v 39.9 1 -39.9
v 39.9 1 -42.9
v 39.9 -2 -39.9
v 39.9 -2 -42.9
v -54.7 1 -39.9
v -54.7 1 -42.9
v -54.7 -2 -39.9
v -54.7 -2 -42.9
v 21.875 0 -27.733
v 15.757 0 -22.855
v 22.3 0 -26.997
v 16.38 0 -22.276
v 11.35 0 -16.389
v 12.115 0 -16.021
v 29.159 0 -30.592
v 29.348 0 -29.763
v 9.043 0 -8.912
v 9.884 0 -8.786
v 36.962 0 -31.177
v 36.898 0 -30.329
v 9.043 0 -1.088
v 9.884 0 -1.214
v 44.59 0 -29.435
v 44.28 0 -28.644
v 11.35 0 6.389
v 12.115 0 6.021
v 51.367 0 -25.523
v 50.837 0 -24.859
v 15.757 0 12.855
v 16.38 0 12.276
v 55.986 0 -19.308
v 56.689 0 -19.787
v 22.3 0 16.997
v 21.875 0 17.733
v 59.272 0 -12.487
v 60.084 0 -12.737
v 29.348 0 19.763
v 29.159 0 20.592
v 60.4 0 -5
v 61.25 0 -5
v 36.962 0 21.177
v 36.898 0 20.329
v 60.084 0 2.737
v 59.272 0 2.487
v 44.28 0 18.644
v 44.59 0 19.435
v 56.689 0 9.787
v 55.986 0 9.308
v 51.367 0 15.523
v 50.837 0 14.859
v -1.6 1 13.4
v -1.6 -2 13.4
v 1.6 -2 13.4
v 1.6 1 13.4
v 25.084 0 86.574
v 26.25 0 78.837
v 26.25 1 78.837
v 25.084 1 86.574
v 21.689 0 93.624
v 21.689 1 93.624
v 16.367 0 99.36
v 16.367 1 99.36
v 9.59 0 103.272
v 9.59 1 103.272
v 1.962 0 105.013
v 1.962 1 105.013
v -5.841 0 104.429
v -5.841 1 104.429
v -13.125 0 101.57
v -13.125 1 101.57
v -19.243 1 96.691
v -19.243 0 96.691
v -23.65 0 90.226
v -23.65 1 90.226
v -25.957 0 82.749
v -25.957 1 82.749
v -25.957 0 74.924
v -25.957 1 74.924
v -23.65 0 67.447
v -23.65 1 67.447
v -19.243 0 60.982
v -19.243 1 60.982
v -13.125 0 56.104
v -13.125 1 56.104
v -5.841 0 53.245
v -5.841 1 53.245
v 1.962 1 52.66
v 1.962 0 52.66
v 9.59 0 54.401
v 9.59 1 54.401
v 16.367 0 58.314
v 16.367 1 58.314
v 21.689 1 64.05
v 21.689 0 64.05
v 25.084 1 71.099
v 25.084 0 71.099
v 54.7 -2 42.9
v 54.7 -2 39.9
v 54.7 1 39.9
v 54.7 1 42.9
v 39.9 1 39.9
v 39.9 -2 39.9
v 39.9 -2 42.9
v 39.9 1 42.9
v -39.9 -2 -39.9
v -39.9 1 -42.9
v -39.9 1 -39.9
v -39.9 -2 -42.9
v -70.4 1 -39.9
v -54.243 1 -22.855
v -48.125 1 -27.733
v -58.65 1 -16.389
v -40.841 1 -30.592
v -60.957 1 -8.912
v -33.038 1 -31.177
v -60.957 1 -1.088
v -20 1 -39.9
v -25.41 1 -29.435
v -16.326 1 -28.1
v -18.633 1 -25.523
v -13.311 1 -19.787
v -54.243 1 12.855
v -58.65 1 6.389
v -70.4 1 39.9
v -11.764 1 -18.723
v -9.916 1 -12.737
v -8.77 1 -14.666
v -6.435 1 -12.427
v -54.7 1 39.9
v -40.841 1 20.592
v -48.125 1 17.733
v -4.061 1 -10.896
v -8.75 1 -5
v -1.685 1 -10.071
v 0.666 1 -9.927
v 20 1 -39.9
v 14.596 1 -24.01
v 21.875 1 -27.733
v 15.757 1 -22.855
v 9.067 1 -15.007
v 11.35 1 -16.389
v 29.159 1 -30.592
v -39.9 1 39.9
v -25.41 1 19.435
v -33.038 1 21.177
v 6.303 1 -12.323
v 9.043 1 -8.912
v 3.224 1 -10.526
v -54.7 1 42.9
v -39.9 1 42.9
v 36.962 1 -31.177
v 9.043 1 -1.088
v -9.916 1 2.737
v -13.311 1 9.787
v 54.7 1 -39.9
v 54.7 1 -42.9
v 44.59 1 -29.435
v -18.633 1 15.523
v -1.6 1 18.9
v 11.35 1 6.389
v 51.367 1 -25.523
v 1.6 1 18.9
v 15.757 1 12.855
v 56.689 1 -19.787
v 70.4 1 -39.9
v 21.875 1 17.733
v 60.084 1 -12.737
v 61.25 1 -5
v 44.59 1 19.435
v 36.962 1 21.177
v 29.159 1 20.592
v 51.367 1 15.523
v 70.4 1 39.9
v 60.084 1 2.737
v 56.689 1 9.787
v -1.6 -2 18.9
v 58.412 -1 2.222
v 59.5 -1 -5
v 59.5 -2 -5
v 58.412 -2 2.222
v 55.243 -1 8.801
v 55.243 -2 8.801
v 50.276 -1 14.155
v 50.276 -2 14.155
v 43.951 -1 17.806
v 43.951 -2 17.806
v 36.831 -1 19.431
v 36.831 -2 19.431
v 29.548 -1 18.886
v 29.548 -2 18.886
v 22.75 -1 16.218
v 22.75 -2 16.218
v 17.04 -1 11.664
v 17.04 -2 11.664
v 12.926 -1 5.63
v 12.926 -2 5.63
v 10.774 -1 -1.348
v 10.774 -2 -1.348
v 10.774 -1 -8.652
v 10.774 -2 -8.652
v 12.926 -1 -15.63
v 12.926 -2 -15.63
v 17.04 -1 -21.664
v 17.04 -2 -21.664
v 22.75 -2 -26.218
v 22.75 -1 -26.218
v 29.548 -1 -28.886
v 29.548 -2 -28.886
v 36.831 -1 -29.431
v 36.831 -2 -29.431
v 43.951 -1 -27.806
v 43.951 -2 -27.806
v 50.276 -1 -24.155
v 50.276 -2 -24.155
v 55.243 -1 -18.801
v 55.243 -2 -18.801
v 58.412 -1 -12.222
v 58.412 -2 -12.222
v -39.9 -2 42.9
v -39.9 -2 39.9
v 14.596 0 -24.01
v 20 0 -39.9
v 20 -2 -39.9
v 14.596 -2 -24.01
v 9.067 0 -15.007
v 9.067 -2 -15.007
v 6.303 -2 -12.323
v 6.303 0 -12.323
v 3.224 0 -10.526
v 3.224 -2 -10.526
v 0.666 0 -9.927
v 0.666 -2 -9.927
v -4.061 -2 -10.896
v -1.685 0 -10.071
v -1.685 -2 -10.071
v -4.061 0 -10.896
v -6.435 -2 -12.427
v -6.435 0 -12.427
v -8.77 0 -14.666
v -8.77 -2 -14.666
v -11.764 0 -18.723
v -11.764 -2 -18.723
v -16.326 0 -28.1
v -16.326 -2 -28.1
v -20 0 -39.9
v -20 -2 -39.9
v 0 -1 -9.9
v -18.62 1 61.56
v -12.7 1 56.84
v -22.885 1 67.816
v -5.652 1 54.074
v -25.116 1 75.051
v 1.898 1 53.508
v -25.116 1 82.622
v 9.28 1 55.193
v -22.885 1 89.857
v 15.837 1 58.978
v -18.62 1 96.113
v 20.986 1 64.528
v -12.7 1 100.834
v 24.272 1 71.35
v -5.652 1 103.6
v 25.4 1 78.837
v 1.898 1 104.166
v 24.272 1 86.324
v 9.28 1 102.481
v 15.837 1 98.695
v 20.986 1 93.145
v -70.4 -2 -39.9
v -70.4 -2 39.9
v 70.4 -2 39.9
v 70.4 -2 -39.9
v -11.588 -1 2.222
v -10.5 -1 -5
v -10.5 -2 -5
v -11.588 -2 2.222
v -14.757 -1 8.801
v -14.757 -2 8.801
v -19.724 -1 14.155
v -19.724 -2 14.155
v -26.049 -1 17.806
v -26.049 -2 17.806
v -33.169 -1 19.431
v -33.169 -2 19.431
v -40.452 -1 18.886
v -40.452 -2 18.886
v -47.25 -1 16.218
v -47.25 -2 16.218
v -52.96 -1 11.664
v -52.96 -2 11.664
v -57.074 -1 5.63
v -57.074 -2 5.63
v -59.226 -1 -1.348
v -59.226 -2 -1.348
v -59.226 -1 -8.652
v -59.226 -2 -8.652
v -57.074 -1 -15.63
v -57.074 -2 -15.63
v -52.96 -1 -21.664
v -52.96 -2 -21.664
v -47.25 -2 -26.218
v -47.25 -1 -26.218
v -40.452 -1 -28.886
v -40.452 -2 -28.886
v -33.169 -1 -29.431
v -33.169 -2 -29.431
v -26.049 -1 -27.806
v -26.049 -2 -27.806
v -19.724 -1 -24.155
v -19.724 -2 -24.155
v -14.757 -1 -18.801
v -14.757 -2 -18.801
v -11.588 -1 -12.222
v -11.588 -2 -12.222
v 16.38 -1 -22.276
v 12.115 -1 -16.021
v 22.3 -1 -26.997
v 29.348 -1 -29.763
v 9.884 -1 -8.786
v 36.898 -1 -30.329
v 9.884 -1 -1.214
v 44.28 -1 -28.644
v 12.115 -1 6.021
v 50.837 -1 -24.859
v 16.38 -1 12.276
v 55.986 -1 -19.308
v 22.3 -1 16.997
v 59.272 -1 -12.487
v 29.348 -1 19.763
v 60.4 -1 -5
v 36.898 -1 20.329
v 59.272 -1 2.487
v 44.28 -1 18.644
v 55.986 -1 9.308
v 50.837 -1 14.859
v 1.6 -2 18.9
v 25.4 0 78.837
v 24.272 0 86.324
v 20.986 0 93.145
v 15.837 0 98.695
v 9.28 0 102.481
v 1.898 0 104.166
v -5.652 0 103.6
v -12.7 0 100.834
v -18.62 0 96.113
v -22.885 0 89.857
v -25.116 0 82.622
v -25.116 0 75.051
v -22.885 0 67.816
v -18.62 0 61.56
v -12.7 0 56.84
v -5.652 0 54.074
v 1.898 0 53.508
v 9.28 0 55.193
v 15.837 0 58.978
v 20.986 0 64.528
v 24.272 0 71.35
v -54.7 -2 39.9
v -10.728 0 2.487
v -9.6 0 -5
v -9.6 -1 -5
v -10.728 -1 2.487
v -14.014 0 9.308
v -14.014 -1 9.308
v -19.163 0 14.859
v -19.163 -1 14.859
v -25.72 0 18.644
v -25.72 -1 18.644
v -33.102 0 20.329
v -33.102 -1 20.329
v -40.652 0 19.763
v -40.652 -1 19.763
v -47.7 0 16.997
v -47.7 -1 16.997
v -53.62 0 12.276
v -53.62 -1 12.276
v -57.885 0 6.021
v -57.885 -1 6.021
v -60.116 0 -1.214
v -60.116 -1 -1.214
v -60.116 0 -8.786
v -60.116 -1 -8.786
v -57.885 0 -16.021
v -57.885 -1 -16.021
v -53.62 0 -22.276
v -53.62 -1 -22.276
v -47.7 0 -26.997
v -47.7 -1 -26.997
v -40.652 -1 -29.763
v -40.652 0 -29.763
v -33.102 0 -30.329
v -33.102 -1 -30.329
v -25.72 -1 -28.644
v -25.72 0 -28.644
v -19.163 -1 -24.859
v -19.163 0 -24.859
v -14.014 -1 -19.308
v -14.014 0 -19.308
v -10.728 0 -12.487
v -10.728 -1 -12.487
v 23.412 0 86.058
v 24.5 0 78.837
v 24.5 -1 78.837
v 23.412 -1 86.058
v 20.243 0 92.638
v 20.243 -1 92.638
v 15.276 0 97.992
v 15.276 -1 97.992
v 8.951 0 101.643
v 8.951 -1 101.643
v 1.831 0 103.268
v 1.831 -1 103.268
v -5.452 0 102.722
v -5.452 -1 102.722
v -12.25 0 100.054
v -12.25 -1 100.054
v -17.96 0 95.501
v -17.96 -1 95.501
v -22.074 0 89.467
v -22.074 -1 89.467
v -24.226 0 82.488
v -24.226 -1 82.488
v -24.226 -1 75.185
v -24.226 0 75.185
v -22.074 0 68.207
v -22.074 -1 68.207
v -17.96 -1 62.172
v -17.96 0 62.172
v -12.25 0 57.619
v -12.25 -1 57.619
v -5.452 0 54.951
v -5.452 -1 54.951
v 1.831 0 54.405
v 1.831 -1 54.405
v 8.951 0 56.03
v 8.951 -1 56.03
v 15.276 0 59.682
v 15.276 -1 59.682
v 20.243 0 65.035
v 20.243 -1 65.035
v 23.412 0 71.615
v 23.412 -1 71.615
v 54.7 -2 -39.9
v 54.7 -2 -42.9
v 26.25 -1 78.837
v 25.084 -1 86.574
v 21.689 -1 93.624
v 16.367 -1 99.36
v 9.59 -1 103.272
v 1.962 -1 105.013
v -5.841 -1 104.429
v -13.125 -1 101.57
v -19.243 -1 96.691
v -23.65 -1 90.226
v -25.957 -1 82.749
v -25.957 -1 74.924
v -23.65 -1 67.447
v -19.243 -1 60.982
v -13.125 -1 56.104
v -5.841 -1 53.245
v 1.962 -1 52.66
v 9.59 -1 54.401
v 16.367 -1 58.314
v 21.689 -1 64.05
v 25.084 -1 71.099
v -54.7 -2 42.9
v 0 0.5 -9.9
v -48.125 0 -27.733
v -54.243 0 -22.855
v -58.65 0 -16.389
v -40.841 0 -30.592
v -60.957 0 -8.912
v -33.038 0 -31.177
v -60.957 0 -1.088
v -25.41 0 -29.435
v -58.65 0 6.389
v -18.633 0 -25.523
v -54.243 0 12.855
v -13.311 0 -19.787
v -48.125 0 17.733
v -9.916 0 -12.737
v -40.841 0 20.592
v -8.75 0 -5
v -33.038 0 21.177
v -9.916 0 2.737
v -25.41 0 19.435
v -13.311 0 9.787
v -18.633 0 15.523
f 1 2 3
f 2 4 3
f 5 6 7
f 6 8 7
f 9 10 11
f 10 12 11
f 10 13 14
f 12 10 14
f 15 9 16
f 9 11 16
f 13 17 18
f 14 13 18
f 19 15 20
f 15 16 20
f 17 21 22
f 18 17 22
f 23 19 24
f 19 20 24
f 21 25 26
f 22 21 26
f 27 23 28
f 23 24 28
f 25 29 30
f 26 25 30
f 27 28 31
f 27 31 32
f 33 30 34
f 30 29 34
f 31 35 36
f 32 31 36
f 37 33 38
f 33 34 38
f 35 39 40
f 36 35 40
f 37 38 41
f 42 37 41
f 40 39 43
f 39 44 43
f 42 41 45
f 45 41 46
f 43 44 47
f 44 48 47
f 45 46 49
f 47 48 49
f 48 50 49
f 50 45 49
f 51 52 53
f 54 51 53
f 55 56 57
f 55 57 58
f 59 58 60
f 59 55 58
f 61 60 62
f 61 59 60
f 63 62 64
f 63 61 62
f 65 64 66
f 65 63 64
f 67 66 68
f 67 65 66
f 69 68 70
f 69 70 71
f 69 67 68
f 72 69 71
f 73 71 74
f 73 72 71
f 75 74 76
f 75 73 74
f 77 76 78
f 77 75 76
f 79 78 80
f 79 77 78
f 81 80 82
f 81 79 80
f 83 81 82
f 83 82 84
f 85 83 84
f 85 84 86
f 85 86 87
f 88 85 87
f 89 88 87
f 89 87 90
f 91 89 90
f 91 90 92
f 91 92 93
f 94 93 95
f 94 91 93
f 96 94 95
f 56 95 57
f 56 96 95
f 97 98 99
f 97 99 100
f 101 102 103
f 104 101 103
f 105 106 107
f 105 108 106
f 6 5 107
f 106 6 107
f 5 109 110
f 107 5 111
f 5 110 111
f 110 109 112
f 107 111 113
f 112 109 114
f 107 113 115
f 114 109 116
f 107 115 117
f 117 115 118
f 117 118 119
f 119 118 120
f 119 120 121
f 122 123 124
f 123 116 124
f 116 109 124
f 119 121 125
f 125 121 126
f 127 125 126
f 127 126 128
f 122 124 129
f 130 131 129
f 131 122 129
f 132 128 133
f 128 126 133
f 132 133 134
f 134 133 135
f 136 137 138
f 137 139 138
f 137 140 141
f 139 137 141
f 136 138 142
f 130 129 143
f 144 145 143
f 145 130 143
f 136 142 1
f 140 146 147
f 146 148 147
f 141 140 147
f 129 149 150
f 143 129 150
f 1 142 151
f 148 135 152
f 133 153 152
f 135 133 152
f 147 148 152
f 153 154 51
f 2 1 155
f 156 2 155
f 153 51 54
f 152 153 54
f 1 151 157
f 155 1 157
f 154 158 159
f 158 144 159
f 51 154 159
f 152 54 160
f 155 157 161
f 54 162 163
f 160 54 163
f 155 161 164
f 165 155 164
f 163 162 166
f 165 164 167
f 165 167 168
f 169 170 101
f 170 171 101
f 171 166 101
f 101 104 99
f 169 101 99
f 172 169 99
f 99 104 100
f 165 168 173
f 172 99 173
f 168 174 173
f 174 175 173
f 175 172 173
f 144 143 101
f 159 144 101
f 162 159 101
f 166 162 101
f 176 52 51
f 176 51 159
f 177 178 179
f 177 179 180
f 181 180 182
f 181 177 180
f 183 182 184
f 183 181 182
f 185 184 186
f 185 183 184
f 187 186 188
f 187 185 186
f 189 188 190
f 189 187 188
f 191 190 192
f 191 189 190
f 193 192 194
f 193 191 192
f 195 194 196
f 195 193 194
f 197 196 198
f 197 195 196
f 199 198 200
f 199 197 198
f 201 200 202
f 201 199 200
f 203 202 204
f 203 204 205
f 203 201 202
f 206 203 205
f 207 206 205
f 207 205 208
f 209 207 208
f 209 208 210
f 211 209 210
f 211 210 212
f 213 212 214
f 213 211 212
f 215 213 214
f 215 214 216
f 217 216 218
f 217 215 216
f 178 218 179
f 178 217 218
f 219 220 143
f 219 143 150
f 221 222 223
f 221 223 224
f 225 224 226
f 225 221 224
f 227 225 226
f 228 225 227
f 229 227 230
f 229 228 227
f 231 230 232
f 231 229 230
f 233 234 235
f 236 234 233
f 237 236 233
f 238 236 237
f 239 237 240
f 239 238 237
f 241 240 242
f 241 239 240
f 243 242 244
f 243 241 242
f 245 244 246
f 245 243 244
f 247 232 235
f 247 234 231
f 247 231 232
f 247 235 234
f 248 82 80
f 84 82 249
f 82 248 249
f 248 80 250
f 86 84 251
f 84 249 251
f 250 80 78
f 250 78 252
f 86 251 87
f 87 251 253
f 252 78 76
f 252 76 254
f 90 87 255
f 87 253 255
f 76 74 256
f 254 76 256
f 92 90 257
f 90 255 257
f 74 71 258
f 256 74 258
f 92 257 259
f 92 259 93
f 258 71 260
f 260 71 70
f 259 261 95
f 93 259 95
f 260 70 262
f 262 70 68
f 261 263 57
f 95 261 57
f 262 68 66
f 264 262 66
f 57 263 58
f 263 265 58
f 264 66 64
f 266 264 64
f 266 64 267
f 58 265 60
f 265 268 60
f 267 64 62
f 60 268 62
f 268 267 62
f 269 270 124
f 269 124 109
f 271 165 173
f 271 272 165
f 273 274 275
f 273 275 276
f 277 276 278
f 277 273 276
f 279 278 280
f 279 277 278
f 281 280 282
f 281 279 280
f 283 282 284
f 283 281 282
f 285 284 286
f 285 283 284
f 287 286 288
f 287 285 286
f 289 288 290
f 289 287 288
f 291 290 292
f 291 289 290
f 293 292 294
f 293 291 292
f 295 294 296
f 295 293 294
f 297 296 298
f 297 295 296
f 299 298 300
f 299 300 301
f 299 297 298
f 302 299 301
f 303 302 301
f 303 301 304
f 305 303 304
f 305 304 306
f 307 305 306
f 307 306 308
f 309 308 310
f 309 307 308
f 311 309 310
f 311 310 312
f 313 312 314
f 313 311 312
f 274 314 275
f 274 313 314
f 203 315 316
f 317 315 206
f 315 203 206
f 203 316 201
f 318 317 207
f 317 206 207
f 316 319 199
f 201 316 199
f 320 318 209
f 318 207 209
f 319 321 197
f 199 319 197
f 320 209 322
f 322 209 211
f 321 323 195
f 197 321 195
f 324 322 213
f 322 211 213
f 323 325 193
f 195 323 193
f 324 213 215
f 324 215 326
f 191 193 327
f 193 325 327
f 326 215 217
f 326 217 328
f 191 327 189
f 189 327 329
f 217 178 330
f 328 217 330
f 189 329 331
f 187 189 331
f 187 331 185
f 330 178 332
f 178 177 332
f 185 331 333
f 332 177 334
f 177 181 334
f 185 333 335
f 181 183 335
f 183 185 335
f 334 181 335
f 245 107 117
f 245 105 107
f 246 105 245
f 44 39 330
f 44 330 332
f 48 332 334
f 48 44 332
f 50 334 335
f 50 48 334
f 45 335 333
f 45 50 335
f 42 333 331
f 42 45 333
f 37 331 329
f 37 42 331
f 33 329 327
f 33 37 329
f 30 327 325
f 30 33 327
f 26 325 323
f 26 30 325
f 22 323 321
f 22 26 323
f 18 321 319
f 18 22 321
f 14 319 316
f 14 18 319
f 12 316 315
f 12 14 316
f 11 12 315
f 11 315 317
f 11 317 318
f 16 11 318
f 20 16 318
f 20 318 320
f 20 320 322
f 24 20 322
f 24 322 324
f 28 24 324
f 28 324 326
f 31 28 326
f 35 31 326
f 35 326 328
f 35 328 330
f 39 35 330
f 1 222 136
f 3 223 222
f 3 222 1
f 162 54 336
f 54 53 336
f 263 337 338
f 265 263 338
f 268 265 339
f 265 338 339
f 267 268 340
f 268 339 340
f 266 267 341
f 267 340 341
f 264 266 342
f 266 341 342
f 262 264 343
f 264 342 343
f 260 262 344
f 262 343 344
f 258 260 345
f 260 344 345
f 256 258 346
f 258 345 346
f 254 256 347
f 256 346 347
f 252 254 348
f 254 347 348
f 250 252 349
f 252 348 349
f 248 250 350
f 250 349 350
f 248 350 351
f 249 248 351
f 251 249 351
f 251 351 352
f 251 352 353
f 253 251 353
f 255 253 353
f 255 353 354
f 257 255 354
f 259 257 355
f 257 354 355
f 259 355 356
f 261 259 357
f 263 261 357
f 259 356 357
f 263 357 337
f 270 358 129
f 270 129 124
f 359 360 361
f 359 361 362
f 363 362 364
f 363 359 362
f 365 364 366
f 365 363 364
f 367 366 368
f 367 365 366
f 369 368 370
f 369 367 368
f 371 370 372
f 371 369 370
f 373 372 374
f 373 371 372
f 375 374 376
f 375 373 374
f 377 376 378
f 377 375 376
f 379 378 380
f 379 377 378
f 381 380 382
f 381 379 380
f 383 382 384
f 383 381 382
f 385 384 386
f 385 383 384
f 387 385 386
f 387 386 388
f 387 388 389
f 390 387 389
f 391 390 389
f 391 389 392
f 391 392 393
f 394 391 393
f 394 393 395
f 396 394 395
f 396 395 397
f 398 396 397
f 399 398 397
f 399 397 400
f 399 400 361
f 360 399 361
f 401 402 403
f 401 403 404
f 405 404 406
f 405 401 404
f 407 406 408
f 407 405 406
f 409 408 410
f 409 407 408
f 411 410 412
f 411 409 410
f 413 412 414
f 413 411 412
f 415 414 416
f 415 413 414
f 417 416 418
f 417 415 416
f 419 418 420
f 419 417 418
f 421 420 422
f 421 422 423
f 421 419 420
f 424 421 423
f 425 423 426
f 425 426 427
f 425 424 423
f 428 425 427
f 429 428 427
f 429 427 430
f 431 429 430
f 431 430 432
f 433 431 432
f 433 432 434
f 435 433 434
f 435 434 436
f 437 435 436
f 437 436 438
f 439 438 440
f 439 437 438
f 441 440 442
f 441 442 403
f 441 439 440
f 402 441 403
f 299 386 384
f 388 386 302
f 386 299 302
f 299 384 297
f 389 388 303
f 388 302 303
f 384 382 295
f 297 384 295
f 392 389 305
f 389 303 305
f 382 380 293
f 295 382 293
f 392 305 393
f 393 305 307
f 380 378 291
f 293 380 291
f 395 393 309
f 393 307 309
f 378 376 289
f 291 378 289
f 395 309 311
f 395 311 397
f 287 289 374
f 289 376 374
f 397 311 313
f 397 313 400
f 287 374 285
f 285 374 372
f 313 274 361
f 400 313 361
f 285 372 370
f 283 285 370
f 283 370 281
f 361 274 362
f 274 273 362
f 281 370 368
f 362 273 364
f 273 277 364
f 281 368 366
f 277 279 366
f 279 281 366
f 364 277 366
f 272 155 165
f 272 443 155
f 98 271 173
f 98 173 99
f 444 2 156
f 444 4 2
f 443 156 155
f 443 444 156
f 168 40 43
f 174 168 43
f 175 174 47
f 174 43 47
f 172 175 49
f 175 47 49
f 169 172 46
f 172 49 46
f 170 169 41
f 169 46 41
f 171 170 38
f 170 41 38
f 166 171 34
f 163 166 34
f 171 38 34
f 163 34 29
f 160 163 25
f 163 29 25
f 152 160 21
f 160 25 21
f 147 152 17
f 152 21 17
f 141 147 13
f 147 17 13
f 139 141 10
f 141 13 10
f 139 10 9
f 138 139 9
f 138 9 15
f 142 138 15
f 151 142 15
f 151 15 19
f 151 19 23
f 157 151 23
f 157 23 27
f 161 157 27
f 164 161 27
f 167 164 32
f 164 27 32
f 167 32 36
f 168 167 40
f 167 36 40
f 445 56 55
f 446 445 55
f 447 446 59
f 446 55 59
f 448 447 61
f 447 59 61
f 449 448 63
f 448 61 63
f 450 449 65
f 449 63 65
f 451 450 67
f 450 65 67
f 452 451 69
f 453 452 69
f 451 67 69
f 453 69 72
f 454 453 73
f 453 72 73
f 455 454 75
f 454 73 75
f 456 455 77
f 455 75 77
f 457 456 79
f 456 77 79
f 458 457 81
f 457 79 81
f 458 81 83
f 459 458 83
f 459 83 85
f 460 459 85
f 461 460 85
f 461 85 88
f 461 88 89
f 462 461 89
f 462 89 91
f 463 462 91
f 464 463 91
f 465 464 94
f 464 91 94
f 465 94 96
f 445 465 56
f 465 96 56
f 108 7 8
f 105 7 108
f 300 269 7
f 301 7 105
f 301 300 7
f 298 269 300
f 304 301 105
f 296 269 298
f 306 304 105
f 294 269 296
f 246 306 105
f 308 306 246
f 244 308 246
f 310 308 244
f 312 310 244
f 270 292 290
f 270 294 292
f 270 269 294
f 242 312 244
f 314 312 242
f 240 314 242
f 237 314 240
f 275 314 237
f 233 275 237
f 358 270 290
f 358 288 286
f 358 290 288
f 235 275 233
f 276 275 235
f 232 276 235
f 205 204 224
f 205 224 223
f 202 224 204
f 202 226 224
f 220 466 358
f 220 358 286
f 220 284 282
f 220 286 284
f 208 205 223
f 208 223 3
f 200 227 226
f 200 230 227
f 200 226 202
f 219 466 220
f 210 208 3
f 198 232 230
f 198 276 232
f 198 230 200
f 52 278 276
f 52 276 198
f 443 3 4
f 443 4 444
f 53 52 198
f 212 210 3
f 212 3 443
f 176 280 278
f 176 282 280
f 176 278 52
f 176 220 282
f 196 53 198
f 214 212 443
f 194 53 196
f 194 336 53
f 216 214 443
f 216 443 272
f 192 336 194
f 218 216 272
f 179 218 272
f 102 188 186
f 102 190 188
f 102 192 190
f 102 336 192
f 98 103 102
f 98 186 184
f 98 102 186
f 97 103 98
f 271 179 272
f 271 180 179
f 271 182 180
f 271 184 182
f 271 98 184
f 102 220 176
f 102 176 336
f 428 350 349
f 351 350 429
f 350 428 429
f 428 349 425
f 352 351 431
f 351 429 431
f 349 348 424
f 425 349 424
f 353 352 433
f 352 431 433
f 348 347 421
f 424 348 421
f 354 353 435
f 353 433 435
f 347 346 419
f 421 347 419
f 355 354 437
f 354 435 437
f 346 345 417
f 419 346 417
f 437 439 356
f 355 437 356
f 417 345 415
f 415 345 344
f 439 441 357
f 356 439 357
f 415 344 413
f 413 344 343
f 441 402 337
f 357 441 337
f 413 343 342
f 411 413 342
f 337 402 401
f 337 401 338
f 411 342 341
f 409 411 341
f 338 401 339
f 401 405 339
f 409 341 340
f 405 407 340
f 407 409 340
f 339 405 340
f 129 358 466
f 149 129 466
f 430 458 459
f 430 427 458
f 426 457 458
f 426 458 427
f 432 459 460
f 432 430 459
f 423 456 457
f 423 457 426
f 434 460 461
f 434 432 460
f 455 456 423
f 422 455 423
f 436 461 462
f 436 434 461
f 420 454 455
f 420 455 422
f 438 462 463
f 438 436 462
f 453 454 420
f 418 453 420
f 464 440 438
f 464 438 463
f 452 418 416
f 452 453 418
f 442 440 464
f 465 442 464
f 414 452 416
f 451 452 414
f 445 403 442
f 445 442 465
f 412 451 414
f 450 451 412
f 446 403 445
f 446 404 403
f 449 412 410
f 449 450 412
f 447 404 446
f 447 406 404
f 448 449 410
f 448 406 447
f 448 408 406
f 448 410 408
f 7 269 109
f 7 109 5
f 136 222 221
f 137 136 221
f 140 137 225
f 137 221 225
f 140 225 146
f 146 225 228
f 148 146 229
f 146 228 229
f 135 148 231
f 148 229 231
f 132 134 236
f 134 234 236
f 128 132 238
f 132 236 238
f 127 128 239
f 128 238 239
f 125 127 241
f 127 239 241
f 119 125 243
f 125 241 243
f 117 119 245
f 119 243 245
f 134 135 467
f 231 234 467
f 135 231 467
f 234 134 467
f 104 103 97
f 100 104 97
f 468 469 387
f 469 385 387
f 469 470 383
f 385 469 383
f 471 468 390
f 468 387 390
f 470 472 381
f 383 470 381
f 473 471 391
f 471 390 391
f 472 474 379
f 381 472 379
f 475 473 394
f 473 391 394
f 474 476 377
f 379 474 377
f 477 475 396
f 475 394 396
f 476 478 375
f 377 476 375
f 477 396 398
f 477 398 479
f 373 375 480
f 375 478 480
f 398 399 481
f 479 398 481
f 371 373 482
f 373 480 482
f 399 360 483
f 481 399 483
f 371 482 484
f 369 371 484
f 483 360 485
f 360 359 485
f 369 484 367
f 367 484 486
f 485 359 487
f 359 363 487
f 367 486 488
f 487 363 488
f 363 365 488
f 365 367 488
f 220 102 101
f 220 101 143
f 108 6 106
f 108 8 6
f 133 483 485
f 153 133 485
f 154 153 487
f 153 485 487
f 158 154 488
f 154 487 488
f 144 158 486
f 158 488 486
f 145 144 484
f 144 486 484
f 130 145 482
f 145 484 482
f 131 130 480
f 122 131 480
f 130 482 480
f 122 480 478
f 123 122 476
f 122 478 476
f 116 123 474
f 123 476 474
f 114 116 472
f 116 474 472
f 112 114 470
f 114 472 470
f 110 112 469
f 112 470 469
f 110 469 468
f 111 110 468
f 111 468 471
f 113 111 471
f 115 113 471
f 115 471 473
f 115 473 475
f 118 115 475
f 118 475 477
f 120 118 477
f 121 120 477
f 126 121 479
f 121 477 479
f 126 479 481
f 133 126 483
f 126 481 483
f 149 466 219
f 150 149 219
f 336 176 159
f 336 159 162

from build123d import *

# Parameters (mm, degrees)
F0_R          = 26.25
F0_W          = 3.2
F0_H          = 5.5
F0_W_2        = 14.8
F0_H_2        = 3
F0_R_2        = 25.4
F2_DEPTH      = 2
F2_DEPTH_BACK = 1
F3_DEPTH      = 1
F4_START      = 1
F0_R_3        = 24.5
F4_DEPTH      = 1
F1_R          = 26.25
F1_R_2        = 25.4
F5_DEPTH      = 1
F1_R_3        = 24.5
F6_DEPTH      = 1


with BuildPart() as f2:
    # F0 (on Front) → F2 (new body, two sides)
    with BuildSketch(Plane.XZ) as f2_sk:
        with BuildLine():
            Line((70.4, -39.9), (70.4, 39.9))
            Line((70.4, 39.9), (54.7, 39.9))
            Line((54.7, 39.9), (39.9, 39.9))
            Line((39.9, 39.9), (-39.9, 39.9))
            Line((-39.9, 39.9), (-54.7, 39.9))
            Line((-54.7, 39.9), (-70.4, 39.9))
            Line((-70.4, 39.9), (-70.4, -39.9))
            Line((-70.4, -39.9), (-54.7, -39.9))
            Line((-54.7, -39.9), (-39.9, -39.9))
            Line((-39.9, -39.9), (-20, -39.9))
            add(Edge.make_bspline(
                [(0, -9.9), (-12.5, -9.9), (-20, -39.9)],
                knots=[0, 0, 0, 0.927295218, 0.927295218, 0.927295218], degree=2, weights=[1, 0.894427191, 1]))
            add(Edge.make_bspline(
                [(20, -39.9), (12.5, -9.9), (0, -9.9)],
                knots=[5.3558900892, 5.3558900892, 5.3558900892, 6.2831853072, 6.2831853072, 6.2831853072], degree=2, weights=[1, 0.894427191, 1]))
            Line((20, -39.9), (39.9, -39.9))
            Line((39.9, -39.9), (54.7, -39.9))
            Line((54.7, -39.9), (70.4, -39.9))
        make_face()
        with Locations((-35, -5)):
            Circle(F0_R, mode=Mode.SUBTRACT)
        with Locations((0, 16.15)):
            Rectangle(F0_W, F0_H, mode=Mode.SUBTRACT)
        with Locations((35, -5)):
            Circle(F0_R, mode=Mode.SUBTRACT)
        with Locations((-47.3, 41.4)):
            Rectangle(F0_W_2, F0_H_2)
        with Locations((-47.3, -41.4)):
            Rectangle(F0_W_2, F0_H_2)
        with Locations((47.3, -41.4)):
            Rectangle(F0_W_2, F0_H_2)
        with Locations((47.3, 41.4)):
            Rectangle(F0_W_2, F0_H_2)
        with Locations((-35, -5)):
            Circle(F0_R)
        with Locations((-35, -5)):
            Circle(F0_R_2, mode=Mode.SUBTRACT)
        with Locations((35, -5)):
            Circle(F0_R)
        with Locations((35, -5)):
            Circle(F0_R_2, mode=Mode.SUBTRACT)
    extrude(amount=F2_DEPTH)
    extrude(f2_sk.sketch, amount=-F2_DEPTH_BACK)

    # F0 (on Front) → F3 (cut, through all)
    with BuildSketch(Plane.XZ):
        with Locations((35, -5)):
            Circle(F0_R)
        with Locations((35, -5)):
            Circle(F0_R_2, mode=Mode.SUBTRACT)
        with Locations((-35, -5)):
            Circle(F0_R)
        with Locations((-35, -5)):
            Circle(F0_R_2, mode=Mode.SUBTRACT)
    extrude(amount=-F3_DEPTH, mode=Mode.SUBTRACT)

    # F0 (on Front) → F4 (join)
    with BuildSketch(Plane.XZ.offset(F4_START)):
        with Locations((35, -5)):
            Circle(F0_R_2)
        with Locations((35, -5)):
            Circle(F0_R_3, mode=Mode.SUBTRACT)
        with Locations((-35, -5)):
            Circle(F0_R_2)
        with Locations((-35, -5)):
            Circle(F0_R_3, mode=Mode.SUBTRACT)
    extrude(amount=F4_DEPTH)


with BuildPart() as f5:
    # F1 (on Front) → F5 (new body)
    with BuildSketch(Plane.XZ):
        with Locations((0, 78.8367218888)):
            Circle(F1_R)
        with Locations((0, 78.8367218888)):
            Circle(F1_R_2, mode=Mode.SUBTRACT)
    extrude(amount=-F5_DEPTH)

    # F1 (on Front) → F6 (join)
    with BuildSketch(Plane.XZ):
        with Locations((0, 78.8367218888)):
            Circle(F1_R)
        with Locations((0, 78.8367218888)):
            Circle(F1_R_2, mode=Mode.SUBTRACT)
        with Locations((0, 78.8367218888)):
            Circle(F1_R_2)
        with Locations((0, 78.8367218888)):
            Circle(F1_R_3, mode=Mode.SUBTRACT)
    extrude(amount=F6_DEPTH)


solid = Compound([f2.part, f5.part])
